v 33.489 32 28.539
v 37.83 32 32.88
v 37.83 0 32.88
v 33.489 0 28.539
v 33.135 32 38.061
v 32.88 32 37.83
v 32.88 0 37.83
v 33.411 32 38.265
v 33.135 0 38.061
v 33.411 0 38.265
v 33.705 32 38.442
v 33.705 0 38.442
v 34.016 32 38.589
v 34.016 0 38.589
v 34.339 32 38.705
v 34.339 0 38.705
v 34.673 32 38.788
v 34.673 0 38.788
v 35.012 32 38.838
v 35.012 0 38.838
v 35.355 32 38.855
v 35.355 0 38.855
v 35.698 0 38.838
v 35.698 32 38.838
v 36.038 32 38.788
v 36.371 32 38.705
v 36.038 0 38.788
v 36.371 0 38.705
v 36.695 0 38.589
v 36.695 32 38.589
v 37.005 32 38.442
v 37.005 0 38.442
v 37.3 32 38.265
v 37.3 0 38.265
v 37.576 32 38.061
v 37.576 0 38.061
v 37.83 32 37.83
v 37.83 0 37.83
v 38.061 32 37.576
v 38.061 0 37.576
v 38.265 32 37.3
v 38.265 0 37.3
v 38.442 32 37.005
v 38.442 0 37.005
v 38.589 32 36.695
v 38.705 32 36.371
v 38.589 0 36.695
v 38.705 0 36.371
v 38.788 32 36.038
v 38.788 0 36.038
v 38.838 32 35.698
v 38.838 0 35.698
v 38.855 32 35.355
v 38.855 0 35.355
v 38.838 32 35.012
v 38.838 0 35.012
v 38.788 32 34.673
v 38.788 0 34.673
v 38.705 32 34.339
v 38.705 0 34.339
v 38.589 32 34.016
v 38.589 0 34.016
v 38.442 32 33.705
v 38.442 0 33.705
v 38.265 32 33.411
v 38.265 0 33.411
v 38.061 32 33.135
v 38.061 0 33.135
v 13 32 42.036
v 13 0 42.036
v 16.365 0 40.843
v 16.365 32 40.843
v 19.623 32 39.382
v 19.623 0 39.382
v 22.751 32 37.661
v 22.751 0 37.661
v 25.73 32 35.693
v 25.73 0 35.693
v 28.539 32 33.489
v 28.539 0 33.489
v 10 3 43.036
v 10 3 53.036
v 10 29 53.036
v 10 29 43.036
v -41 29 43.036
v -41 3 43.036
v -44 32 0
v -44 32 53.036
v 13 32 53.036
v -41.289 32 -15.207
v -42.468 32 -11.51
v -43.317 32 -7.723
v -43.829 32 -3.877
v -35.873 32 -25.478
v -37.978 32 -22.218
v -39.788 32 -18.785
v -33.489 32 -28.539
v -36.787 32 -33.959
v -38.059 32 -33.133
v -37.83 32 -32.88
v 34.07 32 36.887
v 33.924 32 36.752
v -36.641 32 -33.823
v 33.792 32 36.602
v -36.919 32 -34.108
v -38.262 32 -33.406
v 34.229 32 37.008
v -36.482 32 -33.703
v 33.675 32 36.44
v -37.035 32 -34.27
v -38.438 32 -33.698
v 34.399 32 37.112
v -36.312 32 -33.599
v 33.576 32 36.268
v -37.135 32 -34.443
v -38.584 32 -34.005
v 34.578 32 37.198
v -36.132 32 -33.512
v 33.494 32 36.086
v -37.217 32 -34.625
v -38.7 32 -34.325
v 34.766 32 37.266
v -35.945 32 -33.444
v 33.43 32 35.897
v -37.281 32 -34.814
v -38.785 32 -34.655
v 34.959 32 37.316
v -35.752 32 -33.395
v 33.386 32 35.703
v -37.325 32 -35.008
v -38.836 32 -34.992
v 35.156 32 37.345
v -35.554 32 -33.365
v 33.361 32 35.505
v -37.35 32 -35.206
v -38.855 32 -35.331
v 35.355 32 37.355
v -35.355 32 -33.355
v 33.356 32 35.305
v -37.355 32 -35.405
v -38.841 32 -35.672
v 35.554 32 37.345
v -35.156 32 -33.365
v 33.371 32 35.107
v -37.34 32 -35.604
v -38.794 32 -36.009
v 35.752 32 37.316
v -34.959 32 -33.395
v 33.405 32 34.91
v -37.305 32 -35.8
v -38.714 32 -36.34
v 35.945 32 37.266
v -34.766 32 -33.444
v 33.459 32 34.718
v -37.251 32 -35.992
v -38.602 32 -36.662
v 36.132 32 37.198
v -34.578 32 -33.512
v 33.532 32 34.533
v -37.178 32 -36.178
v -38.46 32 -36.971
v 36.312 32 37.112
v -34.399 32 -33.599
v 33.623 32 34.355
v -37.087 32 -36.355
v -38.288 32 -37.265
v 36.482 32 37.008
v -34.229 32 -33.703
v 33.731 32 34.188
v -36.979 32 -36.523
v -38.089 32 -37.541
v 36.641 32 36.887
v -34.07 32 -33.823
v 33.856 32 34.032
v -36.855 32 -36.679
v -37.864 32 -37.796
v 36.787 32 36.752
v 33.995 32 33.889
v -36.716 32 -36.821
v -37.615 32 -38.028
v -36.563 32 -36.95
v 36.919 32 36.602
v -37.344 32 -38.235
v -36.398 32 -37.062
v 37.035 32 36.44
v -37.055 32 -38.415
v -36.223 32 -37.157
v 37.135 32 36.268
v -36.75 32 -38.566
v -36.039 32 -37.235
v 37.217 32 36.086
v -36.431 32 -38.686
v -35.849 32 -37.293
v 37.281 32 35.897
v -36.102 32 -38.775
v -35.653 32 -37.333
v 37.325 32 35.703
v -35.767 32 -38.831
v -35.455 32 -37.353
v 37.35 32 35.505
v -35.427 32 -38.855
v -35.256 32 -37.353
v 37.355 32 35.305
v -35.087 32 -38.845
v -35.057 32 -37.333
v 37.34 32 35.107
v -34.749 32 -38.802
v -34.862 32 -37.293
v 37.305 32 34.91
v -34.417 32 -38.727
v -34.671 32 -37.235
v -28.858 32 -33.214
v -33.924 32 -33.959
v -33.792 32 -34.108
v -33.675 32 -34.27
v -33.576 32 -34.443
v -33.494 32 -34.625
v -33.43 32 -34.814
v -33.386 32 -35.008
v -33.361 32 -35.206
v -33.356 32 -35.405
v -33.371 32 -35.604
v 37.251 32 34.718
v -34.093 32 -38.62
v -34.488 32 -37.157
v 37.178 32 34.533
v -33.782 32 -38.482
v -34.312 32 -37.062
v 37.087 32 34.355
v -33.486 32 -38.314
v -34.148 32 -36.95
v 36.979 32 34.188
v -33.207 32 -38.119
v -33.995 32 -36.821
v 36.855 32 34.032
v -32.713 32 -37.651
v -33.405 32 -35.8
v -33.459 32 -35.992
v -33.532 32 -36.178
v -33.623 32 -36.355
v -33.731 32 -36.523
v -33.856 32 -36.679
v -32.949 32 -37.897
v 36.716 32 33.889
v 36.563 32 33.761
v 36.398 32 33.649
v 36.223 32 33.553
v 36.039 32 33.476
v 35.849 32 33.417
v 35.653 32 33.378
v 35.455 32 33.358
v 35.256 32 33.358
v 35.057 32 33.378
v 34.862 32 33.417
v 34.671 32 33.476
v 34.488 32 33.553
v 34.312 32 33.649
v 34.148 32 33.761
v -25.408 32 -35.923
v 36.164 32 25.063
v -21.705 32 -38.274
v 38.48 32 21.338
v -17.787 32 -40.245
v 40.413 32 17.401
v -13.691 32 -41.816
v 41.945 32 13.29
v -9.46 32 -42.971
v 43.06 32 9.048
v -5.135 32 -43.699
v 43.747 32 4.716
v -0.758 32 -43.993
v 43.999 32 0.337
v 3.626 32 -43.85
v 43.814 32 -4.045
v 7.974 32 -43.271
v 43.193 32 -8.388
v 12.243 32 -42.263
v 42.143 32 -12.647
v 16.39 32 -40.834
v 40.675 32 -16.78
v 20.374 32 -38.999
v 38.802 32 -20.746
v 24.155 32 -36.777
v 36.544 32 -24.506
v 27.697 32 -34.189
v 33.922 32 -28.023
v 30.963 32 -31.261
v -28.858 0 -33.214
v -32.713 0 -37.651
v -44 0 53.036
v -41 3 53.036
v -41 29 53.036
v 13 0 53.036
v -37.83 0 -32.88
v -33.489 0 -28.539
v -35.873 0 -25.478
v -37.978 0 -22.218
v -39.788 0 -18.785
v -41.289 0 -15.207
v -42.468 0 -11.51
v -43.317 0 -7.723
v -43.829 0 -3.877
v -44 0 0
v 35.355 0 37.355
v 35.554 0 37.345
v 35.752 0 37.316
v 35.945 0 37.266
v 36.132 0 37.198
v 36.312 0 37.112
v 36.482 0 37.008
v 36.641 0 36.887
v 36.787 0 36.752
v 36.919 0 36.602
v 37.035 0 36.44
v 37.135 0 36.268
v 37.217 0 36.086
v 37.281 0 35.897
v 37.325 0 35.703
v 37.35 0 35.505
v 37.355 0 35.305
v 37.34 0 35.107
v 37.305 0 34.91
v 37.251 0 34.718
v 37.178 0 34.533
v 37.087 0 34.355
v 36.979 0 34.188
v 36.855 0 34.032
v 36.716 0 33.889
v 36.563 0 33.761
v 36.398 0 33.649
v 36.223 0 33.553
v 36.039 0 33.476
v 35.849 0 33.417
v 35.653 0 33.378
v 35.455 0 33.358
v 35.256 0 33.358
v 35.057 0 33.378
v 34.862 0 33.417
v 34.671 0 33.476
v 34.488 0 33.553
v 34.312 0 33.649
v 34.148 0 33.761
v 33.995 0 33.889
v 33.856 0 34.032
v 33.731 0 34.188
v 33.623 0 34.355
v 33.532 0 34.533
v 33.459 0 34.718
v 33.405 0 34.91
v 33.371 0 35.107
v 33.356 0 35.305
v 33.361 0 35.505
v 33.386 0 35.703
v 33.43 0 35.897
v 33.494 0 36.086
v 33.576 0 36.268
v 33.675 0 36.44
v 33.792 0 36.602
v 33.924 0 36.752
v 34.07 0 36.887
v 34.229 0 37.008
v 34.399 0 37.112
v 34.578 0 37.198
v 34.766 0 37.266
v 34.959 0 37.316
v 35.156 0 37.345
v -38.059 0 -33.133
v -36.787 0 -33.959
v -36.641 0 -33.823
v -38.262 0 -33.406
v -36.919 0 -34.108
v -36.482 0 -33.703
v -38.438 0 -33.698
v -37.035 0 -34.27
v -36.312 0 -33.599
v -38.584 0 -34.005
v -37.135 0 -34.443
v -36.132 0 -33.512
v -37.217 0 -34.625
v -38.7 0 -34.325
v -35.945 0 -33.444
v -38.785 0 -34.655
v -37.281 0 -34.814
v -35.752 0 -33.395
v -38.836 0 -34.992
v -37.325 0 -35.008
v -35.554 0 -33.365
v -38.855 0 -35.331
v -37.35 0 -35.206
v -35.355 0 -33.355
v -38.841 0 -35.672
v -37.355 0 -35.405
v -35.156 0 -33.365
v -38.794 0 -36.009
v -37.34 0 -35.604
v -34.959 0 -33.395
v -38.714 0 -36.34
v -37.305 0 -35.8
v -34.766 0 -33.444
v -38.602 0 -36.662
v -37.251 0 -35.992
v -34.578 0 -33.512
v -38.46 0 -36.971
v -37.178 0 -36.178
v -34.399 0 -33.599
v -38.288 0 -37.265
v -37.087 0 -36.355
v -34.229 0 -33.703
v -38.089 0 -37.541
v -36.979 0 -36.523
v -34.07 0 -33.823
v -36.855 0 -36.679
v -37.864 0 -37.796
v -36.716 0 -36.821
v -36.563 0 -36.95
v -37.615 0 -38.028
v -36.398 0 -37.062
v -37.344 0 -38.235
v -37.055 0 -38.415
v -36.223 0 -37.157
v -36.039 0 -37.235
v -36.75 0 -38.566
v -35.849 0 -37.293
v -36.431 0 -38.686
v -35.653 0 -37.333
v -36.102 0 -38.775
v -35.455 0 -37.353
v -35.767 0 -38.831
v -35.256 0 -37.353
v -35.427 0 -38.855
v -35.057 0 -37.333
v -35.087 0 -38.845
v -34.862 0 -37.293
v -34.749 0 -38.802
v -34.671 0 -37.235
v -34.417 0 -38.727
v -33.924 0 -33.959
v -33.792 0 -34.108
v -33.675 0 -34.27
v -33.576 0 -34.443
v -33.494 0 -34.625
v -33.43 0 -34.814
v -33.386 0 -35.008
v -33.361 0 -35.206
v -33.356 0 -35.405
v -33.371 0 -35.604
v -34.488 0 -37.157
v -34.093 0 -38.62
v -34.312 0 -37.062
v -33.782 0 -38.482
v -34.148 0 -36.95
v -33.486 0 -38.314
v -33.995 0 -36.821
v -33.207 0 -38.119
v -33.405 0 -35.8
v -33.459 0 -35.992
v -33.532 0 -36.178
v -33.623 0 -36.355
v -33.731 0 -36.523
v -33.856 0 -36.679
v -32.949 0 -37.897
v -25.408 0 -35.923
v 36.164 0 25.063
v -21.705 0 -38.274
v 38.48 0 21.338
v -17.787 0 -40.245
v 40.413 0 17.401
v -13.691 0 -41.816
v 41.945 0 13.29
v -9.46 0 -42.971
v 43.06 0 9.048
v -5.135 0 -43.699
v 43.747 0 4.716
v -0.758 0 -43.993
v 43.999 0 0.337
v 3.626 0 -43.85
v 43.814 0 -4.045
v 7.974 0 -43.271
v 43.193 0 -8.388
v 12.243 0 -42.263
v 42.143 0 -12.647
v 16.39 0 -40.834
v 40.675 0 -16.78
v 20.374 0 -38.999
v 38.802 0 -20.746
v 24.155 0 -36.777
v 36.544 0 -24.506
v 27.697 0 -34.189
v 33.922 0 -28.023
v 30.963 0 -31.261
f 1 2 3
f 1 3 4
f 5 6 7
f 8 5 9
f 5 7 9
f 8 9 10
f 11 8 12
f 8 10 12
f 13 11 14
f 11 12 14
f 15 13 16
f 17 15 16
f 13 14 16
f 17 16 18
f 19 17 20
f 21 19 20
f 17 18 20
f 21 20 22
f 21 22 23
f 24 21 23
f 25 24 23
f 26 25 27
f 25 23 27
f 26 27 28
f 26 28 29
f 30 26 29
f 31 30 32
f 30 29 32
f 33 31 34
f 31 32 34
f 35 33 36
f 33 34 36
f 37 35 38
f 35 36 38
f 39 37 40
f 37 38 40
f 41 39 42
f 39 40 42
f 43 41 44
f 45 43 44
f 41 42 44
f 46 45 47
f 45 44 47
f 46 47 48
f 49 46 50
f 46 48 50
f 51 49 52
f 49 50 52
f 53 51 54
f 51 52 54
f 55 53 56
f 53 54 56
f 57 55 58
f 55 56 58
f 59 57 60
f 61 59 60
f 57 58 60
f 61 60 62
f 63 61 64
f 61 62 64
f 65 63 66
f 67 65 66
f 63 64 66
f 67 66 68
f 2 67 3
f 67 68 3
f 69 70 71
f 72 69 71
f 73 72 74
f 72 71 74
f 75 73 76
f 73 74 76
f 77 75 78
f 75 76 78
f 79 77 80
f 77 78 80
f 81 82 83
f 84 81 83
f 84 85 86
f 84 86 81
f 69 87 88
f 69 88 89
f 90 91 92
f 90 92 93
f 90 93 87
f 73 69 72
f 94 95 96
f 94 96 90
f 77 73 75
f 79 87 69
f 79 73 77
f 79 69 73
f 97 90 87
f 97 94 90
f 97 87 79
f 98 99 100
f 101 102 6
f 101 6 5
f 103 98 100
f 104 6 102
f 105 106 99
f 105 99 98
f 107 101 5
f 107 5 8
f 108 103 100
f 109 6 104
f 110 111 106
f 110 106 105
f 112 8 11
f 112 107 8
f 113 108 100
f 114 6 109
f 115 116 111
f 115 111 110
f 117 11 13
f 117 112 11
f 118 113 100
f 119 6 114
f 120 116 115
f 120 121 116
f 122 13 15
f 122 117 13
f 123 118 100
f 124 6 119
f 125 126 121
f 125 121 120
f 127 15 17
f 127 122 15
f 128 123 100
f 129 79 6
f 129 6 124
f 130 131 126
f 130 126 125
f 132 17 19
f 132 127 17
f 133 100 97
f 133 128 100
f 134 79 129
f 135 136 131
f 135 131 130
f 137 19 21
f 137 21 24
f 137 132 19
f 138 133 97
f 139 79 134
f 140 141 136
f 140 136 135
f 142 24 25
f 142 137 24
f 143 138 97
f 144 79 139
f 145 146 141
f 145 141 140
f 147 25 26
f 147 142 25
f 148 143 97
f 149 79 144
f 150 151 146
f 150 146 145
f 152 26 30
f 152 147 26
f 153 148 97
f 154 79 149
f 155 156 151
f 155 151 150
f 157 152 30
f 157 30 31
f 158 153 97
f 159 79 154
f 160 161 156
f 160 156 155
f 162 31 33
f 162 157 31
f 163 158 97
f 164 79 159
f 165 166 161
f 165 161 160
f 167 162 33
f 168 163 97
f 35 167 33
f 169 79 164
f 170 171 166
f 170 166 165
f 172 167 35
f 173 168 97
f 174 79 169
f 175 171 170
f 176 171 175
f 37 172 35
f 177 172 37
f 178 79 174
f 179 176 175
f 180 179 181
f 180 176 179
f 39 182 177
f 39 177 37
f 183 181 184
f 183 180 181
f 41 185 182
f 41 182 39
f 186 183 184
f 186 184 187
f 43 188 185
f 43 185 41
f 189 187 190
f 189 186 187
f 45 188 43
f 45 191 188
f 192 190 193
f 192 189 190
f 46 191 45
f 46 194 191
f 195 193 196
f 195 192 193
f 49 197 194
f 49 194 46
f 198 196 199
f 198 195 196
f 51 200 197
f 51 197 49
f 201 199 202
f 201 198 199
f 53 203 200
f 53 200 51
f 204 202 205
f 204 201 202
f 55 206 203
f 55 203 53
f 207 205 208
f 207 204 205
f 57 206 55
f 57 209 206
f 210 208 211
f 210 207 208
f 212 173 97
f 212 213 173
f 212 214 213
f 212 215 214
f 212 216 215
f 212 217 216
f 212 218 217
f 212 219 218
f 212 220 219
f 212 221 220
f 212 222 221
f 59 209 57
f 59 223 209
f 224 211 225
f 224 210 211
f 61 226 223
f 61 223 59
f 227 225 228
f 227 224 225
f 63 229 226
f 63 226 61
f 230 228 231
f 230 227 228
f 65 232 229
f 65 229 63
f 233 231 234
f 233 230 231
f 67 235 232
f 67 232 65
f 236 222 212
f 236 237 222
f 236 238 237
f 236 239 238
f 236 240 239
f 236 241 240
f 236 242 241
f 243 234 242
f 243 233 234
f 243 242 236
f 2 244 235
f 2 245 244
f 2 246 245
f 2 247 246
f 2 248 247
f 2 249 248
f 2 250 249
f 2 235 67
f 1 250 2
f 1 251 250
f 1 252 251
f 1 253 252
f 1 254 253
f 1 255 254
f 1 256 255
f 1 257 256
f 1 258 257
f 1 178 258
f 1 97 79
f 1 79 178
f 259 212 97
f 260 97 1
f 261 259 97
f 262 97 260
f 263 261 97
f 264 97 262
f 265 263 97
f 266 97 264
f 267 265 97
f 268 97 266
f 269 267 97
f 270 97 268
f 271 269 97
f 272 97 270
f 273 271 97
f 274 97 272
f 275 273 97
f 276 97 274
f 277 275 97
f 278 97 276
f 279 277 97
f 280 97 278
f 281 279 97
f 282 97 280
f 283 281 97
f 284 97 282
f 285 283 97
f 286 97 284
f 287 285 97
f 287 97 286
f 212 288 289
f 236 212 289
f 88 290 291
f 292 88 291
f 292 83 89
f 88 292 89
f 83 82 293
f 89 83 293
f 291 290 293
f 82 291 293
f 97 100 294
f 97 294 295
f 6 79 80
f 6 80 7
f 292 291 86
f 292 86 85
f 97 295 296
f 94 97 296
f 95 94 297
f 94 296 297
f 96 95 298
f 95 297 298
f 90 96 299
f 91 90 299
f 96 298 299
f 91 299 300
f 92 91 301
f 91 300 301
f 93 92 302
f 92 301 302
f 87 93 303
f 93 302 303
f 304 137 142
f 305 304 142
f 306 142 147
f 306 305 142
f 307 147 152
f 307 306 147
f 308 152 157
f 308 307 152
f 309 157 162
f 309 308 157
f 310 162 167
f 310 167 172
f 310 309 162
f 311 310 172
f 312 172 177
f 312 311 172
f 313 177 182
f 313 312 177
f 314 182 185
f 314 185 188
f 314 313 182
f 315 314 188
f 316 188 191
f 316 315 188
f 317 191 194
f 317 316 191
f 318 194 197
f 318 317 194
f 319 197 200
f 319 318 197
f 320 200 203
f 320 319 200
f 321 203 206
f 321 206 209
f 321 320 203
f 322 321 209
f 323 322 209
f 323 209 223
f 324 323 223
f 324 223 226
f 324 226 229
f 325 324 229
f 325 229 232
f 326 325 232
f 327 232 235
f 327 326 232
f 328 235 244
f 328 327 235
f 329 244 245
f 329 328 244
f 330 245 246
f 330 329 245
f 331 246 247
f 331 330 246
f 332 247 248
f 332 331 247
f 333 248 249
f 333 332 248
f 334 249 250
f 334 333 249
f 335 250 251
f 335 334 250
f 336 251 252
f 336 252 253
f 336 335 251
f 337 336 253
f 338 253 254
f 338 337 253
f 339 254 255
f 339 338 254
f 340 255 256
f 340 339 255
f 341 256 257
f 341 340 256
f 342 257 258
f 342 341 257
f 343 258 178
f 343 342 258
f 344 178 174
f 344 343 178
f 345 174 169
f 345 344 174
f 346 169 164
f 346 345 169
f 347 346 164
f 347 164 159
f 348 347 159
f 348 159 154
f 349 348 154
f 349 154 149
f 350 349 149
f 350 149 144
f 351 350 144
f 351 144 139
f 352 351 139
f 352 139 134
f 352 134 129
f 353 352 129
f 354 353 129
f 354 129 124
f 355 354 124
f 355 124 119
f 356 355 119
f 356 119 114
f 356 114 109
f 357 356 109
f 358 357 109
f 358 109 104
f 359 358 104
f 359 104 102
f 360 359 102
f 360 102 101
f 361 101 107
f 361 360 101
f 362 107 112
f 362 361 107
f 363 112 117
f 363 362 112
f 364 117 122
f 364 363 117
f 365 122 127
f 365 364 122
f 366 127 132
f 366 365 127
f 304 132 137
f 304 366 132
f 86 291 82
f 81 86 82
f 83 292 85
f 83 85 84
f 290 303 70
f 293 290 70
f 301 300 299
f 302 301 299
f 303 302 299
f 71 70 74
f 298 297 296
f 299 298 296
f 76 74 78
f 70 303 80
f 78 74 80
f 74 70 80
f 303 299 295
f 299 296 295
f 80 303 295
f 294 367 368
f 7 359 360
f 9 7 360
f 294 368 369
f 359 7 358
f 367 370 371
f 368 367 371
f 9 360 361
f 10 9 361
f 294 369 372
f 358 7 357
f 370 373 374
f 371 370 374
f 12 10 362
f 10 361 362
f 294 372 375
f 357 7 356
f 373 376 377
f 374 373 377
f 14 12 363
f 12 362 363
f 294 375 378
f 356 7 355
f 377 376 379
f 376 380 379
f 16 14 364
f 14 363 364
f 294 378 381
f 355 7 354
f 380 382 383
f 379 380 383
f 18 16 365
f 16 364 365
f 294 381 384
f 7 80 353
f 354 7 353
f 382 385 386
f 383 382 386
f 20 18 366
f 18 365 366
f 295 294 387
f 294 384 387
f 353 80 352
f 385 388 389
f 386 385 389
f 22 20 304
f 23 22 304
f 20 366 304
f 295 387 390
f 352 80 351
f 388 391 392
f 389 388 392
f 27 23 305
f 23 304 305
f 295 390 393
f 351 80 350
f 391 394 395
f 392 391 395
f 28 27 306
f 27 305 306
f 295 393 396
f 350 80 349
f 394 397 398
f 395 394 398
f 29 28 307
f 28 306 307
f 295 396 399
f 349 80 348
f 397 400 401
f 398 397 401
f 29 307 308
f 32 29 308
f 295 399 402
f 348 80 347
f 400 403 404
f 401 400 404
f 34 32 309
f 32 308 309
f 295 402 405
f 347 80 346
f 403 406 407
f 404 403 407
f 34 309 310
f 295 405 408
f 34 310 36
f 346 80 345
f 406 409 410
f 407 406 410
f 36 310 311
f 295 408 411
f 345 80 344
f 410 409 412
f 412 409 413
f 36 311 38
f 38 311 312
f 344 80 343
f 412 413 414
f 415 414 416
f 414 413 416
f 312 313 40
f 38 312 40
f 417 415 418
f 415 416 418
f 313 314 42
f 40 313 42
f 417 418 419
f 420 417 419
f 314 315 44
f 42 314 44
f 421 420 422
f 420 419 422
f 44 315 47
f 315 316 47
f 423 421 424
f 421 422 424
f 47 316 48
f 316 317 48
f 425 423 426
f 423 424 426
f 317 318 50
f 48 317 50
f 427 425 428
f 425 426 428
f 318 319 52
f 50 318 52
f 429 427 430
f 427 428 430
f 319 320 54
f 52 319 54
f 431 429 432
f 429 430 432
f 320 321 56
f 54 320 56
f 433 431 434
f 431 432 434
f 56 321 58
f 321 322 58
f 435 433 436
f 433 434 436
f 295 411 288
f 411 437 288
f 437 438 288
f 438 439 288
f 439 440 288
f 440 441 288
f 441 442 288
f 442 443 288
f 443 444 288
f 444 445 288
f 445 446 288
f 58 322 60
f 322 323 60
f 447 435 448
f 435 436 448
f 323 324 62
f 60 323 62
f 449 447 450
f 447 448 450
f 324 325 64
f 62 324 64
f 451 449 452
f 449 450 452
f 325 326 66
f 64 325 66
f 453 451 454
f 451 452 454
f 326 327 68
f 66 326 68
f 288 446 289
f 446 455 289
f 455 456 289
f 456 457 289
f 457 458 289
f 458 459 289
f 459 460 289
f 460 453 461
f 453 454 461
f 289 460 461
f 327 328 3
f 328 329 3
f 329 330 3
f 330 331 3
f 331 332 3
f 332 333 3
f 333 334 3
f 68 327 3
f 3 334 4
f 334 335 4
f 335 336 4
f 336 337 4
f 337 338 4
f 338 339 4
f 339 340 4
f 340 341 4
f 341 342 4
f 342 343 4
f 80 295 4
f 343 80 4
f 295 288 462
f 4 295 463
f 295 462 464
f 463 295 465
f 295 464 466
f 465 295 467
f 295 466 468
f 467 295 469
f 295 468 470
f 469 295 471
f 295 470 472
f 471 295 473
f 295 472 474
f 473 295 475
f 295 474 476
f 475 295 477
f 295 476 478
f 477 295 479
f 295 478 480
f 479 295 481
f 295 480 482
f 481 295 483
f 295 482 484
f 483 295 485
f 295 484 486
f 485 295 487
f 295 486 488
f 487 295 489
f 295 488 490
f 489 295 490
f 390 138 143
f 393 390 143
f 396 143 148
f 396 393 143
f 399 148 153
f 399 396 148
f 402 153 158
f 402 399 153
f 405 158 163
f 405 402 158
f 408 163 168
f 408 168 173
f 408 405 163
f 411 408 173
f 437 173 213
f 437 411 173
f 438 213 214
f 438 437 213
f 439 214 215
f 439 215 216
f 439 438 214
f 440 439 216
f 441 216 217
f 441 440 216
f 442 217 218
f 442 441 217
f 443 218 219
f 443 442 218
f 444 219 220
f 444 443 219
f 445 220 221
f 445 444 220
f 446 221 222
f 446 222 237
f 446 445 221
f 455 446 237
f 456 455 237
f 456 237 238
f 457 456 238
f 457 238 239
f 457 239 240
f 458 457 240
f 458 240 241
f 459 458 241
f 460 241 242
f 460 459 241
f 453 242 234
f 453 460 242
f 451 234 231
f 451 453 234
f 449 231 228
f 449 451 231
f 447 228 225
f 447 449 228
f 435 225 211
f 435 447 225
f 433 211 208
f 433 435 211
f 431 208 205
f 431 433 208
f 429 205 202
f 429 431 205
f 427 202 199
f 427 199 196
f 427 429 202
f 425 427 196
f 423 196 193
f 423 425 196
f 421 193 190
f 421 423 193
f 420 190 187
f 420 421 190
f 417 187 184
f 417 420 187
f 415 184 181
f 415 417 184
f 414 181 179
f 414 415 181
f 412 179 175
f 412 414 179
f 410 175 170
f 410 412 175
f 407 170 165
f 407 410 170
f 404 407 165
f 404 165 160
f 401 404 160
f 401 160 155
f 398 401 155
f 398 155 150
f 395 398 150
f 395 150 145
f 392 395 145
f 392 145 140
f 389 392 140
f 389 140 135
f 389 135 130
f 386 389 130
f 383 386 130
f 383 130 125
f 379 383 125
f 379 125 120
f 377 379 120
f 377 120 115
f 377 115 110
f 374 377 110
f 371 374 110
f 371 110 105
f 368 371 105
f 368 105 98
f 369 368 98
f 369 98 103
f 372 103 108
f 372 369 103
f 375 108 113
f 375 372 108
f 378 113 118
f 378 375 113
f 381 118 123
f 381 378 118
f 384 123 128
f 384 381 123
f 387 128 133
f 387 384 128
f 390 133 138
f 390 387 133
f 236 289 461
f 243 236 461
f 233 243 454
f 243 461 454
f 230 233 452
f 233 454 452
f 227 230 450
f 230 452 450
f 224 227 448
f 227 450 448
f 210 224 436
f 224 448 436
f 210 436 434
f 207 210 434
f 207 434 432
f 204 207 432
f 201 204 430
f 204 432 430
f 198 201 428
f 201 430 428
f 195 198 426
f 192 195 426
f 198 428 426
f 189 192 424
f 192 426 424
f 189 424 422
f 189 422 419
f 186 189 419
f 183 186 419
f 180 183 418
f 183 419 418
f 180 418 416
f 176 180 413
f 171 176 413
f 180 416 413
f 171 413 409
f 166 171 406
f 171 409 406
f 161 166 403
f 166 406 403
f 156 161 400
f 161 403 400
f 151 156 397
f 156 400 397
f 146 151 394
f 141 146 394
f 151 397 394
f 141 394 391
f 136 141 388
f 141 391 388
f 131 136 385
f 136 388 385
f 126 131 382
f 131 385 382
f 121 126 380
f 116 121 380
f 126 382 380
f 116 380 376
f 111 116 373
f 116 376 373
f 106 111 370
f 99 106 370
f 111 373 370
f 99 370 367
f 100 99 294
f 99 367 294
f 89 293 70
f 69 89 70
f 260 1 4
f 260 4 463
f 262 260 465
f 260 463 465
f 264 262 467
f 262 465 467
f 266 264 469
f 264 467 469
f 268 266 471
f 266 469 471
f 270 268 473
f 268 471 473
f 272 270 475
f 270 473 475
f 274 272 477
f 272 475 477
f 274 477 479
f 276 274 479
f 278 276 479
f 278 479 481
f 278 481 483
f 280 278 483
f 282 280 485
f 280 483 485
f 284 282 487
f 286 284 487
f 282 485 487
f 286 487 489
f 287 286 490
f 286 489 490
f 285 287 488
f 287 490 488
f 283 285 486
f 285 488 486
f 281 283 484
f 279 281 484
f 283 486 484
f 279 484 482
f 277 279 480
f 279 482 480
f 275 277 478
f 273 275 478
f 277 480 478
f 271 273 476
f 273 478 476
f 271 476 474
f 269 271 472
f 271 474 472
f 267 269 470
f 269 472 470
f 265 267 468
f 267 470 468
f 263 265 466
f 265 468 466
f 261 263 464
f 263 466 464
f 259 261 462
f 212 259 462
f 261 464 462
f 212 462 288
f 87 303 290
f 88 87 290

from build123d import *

# Parameters (mm, degrees)
CROQUIS1_R              = 2
SALIENTE_EXTRUIR1_DEPTH = 32
CROQUIS2_W              = 51
CROQUIS2_H              = 26
CORTAR_EXTRUIR1_DEPTH   = 10


with BuildPart() as part:
    # Croquis1 → Saliente-Extruir1 (new body)
    with BuildSketch(Plane(origin=(0, 0, 0), x_dir=(1, 0, 0), z_dir=(0, 1, 0))):
        with BuildLine():
            Line((-37.830212793, 32.880465325), (-33.488983426, 28.539235958))
            ThreePointArc((-33.488983426, 28.539235958), (-41.28871075, 15.206655274), (-44, 0))
            Line((-44, 0), (-44, -53.035699114))
            Line((-44, -53.035699114), (13, -53.035699114))
            Line((13, -53.035699114), (13, -42.035699114))
            ThreePointArc((13, -42.035699114), (21.204683875, -38.553357594), (28.539235958, -33.488983426))
            Line((28.539235958, -33.488983426), (32.880465325, -37.830212793))
            ThreePointArc((32.880465325, -37.830212793), (37.830212793, -37.830212793), (37.830212793, -32.880465325))
            Line((37.830212793, -32.880465325), (33.488983426, -28.539235958))
            ThreePointArc((33.488983426, -28.539235958), (30.963432731, 31.261251311), (-28.858489769, 33.214267541))
            Line((-28.858489769, 33.214267541), (-32.71329505, 37.650900745))
            ThreePointArc((-32.71329505, 37.650900745), (-37.742020856, 37.915368356), (-37.830212793, 32.880465325))
        make_face()
        with Locations(Location((-35.355339059, 35.355339059, 0), (0, 0, 270))):
            Circle(CROQUIS1_R, mode=Mode.SUBTRACT)
        with Locations(Location((35.355339059, -35.355339059, 0), (0, 0, 270))):
            Circle(CROQUIS1_R, mode=Mode.SUBTRACT)
    extrude(amount=SALIENTE_EXTRUIR1_DEPTH)

    # Croquis2 → Cortar-Extruir1 (cut)
    with BuildSketch(Plane.XY.offset(53.035699114)):
        with Locations((-15.5, 16)):
            Rectangle(CROQUIS2_W, CROQUIS2_H)
    extrude(amount=-CORTAR_EXTRUIR1_DEPTH, mode=Mode.SUBTRACT)


solid = part.part
